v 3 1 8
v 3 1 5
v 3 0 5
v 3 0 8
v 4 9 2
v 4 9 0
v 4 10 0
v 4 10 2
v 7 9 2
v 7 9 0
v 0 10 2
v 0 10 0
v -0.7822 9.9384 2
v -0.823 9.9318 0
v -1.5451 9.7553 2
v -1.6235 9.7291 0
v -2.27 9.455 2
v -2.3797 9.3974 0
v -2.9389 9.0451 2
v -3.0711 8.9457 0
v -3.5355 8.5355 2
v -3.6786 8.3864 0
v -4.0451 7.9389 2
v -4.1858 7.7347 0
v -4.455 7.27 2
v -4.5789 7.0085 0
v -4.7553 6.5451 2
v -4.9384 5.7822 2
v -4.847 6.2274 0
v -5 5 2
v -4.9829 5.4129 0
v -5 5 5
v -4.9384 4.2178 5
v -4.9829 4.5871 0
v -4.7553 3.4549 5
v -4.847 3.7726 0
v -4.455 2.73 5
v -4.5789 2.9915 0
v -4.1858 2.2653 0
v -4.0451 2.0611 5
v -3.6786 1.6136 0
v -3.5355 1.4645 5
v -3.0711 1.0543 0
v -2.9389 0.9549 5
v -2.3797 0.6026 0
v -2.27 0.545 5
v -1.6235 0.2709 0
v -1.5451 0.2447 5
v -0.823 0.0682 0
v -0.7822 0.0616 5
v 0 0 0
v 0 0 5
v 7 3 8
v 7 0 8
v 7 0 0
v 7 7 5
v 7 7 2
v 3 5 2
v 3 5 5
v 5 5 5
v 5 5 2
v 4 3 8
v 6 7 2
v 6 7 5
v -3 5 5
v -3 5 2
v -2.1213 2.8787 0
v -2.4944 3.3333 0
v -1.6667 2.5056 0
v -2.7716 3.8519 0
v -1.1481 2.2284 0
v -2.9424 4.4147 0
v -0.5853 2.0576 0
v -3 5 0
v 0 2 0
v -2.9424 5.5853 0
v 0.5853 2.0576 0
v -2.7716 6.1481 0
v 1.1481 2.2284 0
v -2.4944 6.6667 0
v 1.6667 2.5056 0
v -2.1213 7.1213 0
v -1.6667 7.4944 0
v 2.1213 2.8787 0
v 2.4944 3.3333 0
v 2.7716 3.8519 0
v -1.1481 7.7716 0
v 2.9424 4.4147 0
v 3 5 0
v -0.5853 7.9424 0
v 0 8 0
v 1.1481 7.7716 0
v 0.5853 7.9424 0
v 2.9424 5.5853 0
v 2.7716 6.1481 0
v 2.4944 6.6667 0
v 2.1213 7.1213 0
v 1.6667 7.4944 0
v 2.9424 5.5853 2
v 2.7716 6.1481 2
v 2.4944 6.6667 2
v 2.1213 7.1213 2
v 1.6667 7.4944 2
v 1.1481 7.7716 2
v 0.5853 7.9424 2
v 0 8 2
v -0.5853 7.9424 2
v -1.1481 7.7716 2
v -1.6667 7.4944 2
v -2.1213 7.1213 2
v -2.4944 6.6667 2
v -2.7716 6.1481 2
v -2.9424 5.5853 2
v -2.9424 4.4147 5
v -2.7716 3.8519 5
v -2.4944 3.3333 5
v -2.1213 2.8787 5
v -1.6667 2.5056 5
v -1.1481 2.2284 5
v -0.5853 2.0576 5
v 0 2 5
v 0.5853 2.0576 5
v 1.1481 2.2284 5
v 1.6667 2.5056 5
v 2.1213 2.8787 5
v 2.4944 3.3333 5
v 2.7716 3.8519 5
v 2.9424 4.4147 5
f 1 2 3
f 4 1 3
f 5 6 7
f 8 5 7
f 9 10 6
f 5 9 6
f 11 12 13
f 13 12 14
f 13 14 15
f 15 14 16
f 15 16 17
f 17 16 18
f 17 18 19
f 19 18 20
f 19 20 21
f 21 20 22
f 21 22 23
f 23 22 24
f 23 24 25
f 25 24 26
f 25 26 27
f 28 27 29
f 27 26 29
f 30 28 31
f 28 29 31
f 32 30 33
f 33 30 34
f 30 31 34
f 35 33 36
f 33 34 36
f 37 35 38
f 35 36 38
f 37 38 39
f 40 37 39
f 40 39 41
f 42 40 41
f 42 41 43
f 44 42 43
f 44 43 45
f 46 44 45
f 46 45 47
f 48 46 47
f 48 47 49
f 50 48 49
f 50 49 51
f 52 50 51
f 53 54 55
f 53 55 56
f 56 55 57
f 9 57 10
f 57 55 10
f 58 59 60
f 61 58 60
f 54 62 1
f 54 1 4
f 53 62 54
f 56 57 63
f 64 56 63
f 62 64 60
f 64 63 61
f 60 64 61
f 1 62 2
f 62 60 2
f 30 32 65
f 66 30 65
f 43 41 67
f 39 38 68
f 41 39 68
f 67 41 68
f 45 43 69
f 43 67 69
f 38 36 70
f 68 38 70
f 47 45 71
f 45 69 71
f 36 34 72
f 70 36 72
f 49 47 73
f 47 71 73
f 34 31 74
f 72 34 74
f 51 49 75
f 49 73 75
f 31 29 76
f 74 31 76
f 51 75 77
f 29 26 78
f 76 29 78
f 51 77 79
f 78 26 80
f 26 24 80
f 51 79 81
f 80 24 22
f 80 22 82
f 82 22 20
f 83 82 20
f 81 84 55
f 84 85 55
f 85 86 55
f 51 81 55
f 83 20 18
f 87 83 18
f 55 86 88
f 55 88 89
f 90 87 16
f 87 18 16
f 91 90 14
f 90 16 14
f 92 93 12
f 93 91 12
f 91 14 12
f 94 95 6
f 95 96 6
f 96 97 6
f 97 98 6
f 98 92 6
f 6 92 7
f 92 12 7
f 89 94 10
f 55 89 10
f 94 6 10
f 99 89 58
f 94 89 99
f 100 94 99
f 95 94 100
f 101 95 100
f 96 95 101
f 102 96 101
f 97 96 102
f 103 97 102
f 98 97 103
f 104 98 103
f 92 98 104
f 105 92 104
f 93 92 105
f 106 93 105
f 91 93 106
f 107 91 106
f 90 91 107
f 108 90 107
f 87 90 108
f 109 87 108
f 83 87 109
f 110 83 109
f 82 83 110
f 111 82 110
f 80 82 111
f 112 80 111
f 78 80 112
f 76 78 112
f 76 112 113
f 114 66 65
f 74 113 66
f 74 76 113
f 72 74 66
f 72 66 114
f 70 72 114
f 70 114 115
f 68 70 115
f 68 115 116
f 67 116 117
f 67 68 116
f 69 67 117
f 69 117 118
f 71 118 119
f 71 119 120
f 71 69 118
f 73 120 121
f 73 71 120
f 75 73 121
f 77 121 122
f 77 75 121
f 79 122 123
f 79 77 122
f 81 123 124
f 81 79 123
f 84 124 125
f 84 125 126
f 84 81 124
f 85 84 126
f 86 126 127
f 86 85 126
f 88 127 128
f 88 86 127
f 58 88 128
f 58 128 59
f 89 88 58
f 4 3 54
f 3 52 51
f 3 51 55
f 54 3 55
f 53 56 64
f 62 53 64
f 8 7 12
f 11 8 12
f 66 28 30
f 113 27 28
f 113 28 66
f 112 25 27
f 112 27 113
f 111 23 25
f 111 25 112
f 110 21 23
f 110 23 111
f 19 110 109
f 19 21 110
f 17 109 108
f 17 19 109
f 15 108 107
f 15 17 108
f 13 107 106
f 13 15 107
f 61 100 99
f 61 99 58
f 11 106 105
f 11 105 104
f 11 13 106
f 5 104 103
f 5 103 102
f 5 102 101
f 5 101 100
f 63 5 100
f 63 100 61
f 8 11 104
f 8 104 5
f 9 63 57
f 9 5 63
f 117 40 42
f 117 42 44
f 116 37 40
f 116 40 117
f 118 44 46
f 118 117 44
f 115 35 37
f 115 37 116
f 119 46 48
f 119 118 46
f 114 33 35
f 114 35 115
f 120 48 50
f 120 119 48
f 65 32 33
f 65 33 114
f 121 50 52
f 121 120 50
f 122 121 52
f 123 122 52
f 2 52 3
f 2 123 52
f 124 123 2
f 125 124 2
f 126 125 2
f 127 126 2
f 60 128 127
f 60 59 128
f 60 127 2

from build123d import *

# Parameters (mm, degrees)
SKETCH1_R           = 3
BOSS_EXTRUDE1_DEPTH = 5
SKETCH2_W           = 14.277681963
SKETCH2_H           = 5.610279578
CUT_EXTRUDE1_DEPTH  = 3
BOSS_EXTRUDE2_DEPTH = 6
CHAMFER1_SIZE       = 3
CHAMFER1_SIZE2      = 4


with BuildPart() as part:
    # Sketch1 → Boss-Extrude1 (new body)
    with BuildSketch(Plane.XY):
        with BuildLine():
            Line((0, 0), (7, 0))
            Line((7, 0), (7, 9))
            Line((7, 9), (4, 9))
            Line((4, 9), (4, 10))
            Line((4, 10), (0, 10))
            ThreePointArc((0, 10), (-5, 5), (0, 0))
        make_face()
        with Locations((0, 5)):
            Circle(SKETCH1_R, mode=Mode.SUBTRACT)
    extrude(amount=BOSS_EXTRUDE1_DEPTH)

    # Sketch2 → Cut-Extrude1 (cut)
    with BuildSketch(Plane.XY.offset(5)):
        with Locations((2.138840982, 7.805139789)):
            Rectangle(SKETCH2_W, SKETCH2_H)
    extrude(amount=-CUT_EXTRUDE1_DEPTH, mode=Mode.SUBTRACT)

    # Sketch3 → Boss-Extrude2 (add)
    with BuildSketch(Plane.XY.offset(2)):
        Polygon((7, 7), (6, 7), (3, 1), (3, 0), (7, 0), align=None)
    extrude(amount=BOSS_EXTRUDE2_DEPTH)

    # Chamfer1
    chamfer1_edges = [part.edges().sort_by_distance(p)[0] for p in [
        (6.5, 7, 8),
    ]]
    chamfer1_side = [part.faces().sort_by_distance(p)[0] for p in [
        (6.5, 7, 5),
    ]]
    chamfer(chamfer1_edges, length=CHAMFER1_SIZE, length2=CHAMFER1_SIZE2, reference=chamfer1_side[0])


solid = part.part
